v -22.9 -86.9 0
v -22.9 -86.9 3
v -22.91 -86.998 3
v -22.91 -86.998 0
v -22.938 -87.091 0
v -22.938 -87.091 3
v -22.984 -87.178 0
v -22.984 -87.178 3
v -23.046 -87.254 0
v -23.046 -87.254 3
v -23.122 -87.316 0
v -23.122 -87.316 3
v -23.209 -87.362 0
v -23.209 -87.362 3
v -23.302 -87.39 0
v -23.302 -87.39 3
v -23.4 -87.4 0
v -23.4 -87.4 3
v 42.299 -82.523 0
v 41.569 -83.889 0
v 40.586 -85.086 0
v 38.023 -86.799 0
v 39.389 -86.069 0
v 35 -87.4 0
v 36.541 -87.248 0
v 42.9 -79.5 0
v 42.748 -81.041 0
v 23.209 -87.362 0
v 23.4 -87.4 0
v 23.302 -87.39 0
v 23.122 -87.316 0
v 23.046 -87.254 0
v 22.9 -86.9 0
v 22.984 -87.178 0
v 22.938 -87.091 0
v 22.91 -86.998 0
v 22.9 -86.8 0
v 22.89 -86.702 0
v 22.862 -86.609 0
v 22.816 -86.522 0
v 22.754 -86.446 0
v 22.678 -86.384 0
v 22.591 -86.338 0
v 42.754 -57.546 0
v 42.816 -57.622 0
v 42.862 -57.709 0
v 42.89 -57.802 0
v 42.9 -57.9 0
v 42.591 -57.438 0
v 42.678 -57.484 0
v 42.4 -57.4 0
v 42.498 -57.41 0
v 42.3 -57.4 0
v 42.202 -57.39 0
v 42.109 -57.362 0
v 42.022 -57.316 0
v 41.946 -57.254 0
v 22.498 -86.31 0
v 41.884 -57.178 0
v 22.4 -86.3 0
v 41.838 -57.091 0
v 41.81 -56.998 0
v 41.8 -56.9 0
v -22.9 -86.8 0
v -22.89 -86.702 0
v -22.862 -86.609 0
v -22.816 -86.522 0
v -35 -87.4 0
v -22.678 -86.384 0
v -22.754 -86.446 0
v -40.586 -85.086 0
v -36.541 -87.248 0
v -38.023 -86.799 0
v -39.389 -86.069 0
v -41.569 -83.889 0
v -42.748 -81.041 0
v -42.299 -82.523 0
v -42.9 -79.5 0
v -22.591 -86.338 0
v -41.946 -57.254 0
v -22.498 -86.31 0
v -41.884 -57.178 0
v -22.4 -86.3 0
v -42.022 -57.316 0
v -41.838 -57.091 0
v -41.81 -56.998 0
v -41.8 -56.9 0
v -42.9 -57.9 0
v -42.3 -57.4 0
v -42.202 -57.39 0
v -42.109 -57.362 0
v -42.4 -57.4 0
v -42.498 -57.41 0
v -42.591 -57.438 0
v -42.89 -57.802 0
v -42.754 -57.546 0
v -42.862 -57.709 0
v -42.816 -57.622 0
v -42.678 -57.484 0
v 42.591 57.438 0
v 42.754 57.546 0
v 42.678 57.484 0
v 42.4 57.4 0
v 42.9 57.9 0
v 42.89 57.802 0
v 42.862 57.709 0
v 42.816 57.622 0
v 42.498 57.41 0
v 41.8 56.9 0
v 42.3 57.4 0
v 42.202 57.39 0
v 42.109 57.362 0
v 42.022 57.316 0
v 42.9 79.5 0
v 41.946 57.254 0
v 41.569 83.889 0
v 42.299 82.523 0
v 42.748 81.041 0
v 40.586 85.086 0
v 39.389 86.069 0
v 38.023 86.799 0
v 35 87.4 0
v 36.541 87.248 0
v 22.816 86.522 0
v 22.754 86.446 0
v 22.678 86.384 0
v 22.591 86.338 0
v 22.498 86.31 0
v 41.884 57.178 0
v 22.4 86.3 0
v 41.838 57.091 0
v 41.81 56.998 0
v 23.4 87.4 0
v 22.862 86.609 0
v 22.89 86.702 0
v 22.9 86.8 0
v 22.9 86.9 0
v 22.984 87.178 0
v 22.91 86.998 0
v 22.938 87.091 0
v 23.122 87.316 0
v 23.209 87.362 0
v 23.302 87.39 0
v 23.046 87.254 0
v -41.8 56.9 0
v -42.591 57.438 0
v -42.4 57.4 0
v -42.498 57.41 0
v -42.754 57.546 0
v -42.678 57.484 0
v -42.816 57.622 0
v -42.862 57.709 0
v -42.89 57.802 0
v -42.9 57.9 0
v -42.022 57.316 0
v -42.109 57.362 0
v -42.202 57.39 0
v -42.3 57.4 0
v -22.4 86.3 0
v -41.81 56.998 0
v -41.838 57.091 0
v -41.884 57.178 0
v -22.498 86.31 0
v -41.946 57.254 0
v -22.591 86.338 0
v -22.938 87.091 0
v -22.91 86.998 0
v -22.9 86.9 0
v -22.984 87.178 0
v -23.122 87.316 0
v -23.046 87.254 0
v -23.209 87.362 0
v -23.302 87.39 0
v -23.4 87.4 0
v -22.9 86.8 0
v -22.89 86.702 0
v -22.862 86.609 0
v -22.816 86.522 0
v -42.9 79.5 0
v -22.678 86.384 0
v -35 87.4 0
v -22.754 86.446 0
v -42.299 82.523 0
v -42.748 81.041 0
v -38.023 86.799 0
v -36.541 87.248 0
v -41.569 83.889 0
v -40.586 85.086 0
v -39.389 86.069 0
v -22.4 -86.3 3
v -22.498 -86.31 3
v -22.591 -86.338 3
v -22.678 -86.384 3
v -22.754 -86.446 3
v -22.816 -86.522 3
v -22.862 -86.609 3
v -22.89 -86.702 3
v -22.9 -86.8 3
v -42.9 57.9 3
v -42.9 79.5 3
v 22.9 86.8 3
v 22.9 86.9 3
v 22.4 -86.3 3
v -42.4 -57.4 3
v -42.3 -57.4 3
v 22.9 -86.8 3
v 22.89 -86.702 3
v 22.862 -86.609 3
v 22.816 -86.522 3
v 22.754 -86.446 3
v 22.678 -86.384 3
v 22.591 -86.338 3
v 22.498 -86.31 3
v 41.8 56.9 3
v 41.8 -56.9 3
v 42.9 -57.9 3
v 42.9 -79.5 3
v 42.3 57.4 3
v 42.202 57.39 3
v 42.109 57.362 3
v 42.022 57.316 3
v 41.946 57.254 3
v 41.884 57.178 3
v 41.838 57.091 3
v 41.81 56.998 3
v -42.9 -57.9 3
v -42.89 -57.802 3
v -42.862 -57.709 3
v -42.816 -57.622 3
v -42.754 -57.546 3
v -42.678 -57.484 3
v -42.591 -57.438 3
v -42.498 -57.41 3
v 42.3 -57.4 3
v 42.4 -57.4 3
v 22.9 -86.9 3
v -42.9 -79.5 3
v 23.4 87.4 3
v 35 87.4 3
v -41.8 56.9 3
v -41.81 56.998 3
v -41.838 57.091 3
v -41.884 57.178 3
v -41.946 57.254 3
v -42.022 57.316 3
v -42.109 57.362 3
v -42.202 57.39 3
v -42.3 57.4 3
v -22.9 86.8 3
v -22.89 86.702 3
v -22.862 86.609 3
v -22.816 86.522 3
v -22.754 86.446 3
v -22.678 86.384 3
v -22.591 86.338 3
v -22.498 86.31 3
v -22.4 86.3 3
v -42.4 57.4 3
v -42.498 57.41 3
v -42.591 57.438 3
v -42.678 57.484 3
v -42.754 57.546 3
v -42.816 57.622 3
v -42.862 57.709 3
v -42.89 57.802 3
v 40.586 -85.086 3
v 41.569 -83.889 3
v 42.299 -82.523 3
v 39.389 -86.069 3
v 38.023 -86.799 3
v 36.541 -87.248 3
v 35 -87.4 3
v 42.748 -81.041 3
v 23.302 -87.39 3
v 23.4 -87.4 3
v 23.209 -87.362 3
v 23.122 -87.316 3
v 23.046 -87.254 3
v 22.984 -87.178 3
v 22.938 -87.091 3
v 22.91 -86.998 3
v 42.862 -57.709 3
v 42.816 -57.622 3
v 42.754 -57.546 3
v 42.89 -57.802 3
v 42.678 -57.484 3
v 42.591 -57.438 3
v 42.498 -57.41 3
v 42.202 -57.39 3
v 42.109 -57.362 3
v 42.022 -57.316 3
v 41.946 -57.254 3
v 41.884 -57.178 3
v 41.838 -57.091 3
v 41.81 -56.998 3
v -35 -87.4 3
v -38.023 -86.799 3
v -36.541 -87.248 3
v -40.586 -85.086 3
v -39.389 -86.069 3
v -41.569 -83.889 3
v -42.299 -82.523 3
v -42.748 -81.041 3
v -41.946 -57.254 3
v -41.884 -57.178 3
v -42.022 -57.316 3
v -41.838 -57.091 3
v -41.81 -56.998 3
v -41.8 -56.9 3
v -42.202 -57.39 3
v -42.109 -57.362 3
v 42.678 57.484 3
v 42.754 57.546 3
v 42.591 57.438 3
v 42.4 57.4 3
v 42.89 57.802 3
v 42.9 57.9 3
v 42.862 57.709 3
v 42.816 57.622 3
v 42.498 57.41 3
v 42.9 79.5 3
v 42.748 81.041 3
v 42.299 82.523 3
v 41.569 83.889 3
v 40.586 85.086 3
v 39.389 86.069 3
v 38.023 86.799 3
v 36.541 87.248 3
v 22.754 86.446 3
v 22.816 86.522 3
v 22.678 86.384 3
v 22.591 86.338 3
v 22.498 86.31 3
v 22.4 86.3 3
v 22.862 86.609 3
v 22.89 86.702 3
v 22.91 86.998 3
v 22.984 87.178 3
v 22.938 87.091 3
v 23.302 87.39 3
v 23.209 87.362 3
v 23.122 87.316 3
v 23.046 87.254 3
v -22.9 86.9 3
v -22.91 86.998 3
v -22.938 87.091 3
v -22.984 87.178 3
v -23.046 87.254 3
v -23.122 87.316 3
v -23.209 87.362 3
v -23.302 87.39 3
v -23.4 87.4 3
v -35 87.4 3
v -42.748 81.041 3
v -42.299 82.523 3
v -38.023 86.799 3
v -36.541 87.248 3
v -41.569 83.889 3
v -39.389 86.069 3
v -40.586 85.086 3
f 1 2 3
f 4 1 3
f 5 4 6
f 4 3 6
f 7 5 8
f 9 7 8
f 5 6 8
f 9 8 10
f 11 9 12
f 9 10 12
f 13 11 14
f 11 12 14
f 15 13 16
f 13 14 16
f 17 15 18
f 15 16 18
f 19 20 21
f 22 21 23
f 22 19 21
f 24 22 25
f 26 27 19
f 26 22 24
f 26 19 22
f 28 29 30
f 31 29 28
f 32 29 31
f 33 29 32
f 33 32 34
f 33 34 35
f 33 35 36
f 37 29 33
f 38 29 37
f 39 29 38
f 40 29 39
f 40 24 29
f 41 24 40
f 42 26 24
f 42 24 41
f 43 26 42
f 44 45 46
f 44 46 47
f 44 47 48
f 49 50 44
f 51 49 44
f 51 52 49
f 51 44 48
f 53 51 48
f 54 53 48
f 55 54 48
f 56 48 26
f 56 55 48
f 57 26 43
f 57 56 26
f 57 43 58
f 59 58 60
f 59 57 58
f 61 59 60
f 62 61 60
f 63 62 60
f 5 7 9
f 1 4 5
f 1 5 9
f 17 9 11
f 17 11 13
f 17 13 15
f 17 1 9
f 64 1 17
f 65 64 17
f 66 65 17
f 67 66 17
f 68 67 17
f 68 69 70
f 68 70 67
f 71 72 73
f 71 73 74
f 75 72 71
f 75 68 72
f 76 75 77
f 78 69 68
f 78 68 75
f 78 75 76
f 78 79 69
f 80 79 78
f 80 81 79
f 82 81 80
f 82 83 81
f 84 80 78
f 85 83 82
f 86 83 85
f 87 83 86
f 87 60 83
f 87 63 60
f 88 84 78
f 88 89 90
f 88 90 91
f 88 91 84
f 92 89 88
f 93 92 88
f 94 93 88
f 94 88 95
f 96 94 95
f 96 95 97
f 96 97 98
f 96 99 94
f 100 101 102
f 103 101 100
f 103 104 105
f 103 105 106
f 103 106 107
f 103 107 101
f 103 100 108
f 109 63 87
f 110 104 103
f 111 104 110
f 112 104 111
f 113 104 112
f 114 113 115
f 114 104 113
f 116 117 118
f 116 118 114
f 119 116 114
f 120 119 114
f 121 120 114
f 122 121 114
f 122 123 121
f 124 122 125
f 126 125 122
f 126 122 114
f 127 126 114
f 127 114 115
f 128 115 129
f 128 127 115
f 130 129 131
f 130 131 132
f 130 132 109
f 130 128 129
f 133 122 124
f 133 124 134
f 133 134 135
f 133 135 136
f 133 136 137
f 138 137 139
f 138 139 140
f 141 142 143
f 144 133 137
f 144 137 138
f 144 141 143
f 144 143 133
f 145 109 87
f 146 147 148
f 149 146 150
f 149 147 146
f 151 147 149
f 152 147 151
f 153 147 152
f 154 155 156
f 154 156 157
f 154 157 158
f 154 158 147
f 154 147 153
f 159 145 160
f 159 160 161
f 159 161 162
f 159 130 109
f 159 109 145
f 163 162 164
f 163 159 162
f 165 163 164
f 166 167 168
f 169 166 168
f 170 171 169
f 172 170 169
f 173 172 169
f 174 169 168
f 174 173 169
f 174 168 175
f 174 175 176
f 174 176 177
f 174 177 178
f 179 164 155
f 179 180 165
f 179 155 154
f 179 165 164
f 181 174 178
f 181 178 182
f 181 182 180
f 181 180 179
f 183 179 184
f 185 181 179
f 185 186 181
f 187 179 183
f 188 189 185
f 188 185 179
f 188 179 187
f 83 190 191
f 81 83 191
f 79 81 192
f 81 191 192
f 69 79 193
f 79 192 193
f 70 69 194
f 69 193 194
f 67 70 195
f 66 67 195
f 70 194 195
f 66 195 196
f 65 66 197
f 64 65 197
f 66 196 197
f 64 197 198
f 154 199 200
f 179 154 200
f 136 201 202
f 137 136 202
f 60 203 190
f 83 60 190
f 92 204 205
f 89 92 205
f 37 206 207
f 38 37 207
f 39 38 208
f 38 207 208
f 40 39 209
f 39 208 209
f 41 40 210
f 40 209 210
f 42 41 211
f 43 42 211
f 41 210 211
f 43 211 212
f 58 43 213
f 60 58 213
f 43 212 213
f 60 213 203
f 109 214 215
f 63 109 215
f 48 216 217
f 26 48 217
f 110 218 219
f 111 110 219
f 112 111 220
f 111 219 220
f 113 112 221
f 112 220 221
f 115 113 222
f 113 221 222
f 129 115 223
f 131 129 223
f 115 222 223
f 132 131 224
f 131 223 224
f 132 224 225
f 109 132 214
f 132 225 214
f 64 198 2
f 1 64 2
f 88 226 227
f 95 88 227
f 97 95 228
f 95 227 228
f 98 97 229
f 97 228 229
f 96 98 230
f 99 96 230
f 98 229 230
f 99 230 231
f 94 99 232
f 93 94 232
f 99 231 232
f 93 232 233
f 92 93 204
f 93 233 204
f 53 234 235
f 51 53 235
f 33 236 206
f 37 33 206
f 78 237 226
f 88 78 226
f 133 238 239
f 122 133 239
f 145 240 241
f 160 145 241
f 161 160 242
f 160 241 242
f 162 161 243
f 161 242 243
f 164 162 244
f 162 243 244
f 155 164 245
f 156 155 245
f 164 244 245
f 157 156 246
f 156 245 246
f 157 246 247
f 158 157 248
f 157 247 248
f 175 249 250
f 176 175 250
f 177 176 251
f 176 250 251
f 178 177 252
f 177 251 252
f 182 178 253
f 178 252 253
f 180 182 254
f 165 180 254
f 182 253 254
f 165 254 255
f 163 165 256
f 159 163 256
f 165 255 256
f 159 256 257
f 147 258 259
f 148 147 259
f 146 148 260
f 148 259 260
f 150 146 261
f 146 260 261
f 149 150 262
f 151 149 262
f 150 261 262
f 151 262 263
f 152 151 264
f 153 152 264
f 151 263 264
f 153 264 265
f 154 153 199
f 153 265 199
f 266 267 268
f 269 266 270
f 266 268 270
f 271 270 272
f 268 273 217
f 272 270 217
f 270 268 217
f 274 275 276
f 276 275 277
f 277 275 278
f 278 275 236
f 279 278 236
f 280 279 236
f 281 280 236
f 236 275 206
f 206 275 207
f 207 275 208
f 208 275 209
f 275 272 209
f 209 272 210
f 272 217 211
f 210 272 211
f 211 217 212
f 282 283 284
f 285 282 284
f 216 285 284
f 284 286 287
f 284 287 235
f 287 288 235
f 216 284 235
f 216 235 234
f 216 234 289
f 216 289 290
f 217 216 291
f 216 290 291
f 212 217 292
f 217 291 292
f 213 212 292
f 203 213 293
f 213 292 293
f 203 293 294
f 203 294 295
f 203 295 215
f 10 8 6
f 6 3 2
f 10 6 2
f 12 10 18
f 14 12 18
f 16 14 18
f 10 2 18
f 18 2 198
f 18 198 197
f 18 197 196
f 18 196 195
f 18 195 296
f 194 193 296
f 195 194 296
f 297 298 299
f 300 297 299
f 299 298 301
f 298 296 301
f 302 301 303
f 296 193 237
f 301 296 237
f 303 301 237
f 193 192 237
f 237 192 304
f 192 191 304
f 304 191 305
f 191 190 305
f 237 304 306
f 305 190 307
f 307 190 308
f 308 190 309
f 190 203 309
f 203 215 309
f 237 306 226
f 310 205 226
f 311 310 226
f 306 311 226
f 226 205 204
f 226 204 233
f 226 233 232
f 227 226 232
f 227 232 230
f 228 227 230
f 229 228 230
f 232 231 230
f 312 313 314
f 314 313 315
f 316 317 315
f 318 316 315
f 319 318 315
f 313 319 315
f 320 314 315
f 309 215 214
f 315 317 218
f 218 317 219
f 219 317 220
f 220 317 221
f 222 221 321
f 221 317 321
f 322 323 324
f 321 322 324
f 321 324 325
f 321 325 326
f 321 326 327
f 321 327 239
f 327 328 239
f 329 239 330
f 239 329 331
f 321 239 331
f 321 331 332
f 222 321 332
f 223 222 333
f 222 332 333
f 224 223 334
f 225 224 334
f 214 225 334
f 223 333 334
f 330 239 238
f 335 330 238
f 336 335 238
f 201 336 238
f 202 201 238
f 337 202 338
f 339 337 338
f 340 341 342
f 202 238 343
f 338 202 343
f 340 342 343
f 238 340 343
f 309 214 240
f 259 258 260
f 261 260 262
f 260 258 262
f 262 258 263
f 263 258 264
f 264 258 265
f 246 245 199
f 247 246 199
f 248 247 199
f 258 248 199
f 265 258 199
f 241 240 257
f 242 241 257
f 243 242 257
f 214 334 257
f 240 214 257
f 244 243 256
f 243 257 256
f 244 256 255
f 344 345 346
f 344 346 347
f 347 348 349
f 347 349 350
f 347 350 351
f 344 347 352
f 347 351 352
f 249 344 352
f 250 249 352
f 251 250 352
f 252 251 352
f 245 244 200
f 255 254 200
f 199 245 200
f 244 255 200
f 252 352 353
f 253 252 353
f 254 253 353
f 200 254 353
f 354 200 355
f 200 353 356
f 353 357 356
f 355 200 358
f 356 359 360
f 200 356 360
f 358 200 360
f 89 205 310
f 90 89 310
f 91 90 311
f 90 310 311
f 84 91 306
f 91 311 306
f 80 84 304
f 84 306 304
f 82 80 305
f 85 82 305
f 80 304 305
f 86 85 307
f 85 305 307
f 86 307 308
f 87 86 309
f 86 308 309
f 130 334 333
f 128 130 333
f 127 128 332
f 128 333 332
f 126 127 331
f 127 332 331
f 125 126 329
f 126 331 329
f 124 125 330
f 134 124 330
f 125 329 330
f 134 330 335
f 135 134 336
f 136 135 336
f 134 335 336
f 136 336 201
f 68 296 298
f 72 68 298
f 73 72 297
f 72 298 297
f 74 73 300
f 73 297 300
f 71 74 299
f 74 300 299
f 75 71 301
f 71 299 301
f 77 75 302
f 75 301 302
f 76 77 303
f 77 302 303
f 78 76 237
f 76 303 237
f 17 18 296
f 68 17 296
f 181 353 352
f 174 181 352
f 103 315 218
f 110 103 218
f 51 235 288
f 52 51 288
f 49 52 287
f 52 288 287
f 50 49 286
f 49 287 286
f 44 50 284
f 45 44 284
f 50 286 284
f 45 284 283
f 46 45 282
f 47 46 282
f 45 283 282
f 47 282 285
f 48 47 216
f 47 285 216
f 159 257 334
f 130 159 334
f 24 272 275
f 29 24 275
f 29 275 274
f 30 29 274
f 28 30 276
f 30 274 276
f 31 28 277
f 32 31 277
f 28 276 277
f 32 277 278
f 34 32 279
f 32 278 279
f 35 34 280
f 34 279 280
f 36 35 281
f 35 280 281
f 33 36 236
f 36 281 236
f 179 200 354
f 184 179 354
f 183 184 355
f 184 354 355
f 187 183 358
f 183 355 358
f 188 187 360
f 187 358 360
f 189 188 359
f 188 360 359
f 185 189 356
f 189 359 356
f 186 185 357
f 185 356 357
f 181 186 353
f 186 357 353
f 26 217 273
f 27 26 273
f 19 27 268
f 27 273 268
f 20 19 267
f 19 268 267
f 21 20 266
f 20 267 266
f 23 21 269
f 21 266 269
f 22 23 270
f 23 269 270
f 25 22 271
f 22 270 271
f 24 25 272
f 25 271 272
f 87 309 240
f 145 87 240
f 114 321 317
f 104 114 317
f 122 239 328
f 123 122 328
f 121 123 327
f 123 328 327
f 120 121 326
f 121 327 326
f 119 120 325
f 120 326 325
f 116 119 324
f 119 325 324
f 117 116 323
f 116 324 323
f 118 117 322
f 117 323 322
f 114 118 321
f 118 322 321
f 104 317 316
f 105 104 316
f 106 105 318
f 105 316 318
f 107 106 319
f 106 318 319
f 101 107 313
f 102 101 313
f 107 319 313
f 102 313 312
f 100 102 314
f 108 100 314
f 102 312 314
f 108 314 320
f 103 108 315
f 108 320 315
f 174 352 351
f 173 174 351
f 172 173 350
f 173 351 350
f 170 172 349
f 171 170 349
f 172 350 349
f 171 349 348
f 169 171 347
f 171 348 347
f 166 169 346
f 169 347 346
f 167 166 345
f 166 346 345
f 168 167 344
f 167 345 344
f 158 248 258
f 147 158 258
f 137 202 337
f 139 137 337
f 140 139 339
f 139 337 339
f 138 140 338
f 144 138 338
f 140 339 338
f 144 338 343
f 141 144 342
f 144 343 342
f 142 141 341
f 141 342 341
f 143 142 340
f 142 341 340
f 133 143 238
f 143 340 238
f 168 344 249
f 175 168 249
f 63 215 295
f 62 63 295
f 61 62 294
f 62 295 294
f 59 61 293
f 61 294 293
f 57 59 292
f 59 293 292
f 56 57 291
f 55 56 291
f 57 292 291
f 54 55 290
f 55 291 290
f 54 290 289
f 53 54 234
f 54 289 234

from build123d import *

# Parameters (mm, degrees)
BOSS_EXTRUDE1_DEPTH = 3


with BuildPart() as part:
    # Sketch1 → Boss-Extrude1 (new body)
    with BuildSketch(Plane.XY.offset(3)):
        with BuildLine():
            Line((42.4, 57.4), (42.3, 57.4))
            ThreePointArc((42.3, 57.4), (41.946446609, 57.253553391), (41.8, 56.9))
            Line((41.8, 56.9), (41.8, -56.9))
            ThreePointArc((41.8, -56.9), (41.946446609, -57.253553391), (42.3, -57.4))
            Line((42.3, -57.4), (42.4, -57.4))
            ThreePointArc((42.4, -57.4), (42.753553391, -57.546446609), (42.9, -57.9))
            Line((42.9, -57.9), (42.9, -79.5))
            ThreePointArc((42.9, -79.5), (40.586143571, -85.086143571), (35, -87.4))
            Line((35, -87.4), (23.4, -87.4))
            ThreePointArc((23.4, -87.4), (23.046446609, -87.253553391), (22.9, -86.9))
            Line((22.9, -86.9), (22.9, -86.8))
            ThreePointArc((22.9, -86.8), (22.753553391, -86.446446609), (22.4, -86.3))
            Line((22.4, -86.3), (-22.4, -86.3))
            ThreePointArc((-22.4, -86.3), (-22.753553391, -86.446446609), (-22.9, -86.8))
            Line((-22.9, -86.8), (-22.9, -86.9))
            ThreePointArc((-22.9, -86.9), (-23.046446609, -87.253553391), (-23.4, -87.4))
            Line((-23.4, -87.4), (-35, -87.4))
            ThreePointArc((-35, -87.4), (-40.586143571, -85.086143571), (-42.9, -79.5))
            Line((-42.9, -79.5), (-42.9, -57.9))
            ThreePointArc((-42.9, -57.9), (-42.753553391, -57.546446609), (-42.4, -57.4))
            Line((-42.4, -57.4), (-42.3, -57.4))
            ThreePointArc((-42.3, -57.4), (-41.946446609, -57.253553391), (-41.8, -56.9))
            Line((-41.8, -56.9), (-41.8, 56.9))
            ThreePointArc((-41.8, 56.9), (-41.946446609, 57.253553391), (-42.3, 57.4))
            Line((-42.3, 57.4), (-42.4, 57.4))
            ThreePointArc((-42.4, 57.4), (-42.753553391, 57.546446609), (-42.9, 57.9))
            Line((-42.9, 57.9), (-42.9, 79.5))
            ThreePointArc((-42.9, 79.5), (-40.586143571, 85.086143571), (-35, 87.4))
            Line((-35, 87.4), (-23.4, 87.4))
            ThreePointArc((-23.4, 87.4), (-23.046446609, 87.253553391), (-22.9, 86.9))
            Line((-22.9, 86.9), (-22.9, 86.8))
            ThreePointArc((-22.9, 86.8), (-22.753553391, 86.446446609), (-22.4, 86.3))
            Line((-22.4, 86.3), (22.4, 86.3))
            ThreePointArc((22.4, 86.3), (22.753553391, 86.446446609), (22.9, 86.8))
            Line((22.9, 86.8), (22.9, 86.9))
            ThreePointArc((22.9, 86.9), (23.046446609, 87.253553391), (23.4, 87.4))
            Line((23.4, 87.4), (35, 87.4))
            ThreePointArc((35, 87.4), (40.586143571, 85.086143571), (42.9, 79.5))
            Line((42.9, 79.5), (42.9, 57.9))
            ThreePointArc((42.9, 57.9), (42.753553391, 57.546446609), (42.4, 57.4))
        make_face()
    extrude(amount=-BOSS_EXTRUDE1_DEPTH)


solid = part.part
